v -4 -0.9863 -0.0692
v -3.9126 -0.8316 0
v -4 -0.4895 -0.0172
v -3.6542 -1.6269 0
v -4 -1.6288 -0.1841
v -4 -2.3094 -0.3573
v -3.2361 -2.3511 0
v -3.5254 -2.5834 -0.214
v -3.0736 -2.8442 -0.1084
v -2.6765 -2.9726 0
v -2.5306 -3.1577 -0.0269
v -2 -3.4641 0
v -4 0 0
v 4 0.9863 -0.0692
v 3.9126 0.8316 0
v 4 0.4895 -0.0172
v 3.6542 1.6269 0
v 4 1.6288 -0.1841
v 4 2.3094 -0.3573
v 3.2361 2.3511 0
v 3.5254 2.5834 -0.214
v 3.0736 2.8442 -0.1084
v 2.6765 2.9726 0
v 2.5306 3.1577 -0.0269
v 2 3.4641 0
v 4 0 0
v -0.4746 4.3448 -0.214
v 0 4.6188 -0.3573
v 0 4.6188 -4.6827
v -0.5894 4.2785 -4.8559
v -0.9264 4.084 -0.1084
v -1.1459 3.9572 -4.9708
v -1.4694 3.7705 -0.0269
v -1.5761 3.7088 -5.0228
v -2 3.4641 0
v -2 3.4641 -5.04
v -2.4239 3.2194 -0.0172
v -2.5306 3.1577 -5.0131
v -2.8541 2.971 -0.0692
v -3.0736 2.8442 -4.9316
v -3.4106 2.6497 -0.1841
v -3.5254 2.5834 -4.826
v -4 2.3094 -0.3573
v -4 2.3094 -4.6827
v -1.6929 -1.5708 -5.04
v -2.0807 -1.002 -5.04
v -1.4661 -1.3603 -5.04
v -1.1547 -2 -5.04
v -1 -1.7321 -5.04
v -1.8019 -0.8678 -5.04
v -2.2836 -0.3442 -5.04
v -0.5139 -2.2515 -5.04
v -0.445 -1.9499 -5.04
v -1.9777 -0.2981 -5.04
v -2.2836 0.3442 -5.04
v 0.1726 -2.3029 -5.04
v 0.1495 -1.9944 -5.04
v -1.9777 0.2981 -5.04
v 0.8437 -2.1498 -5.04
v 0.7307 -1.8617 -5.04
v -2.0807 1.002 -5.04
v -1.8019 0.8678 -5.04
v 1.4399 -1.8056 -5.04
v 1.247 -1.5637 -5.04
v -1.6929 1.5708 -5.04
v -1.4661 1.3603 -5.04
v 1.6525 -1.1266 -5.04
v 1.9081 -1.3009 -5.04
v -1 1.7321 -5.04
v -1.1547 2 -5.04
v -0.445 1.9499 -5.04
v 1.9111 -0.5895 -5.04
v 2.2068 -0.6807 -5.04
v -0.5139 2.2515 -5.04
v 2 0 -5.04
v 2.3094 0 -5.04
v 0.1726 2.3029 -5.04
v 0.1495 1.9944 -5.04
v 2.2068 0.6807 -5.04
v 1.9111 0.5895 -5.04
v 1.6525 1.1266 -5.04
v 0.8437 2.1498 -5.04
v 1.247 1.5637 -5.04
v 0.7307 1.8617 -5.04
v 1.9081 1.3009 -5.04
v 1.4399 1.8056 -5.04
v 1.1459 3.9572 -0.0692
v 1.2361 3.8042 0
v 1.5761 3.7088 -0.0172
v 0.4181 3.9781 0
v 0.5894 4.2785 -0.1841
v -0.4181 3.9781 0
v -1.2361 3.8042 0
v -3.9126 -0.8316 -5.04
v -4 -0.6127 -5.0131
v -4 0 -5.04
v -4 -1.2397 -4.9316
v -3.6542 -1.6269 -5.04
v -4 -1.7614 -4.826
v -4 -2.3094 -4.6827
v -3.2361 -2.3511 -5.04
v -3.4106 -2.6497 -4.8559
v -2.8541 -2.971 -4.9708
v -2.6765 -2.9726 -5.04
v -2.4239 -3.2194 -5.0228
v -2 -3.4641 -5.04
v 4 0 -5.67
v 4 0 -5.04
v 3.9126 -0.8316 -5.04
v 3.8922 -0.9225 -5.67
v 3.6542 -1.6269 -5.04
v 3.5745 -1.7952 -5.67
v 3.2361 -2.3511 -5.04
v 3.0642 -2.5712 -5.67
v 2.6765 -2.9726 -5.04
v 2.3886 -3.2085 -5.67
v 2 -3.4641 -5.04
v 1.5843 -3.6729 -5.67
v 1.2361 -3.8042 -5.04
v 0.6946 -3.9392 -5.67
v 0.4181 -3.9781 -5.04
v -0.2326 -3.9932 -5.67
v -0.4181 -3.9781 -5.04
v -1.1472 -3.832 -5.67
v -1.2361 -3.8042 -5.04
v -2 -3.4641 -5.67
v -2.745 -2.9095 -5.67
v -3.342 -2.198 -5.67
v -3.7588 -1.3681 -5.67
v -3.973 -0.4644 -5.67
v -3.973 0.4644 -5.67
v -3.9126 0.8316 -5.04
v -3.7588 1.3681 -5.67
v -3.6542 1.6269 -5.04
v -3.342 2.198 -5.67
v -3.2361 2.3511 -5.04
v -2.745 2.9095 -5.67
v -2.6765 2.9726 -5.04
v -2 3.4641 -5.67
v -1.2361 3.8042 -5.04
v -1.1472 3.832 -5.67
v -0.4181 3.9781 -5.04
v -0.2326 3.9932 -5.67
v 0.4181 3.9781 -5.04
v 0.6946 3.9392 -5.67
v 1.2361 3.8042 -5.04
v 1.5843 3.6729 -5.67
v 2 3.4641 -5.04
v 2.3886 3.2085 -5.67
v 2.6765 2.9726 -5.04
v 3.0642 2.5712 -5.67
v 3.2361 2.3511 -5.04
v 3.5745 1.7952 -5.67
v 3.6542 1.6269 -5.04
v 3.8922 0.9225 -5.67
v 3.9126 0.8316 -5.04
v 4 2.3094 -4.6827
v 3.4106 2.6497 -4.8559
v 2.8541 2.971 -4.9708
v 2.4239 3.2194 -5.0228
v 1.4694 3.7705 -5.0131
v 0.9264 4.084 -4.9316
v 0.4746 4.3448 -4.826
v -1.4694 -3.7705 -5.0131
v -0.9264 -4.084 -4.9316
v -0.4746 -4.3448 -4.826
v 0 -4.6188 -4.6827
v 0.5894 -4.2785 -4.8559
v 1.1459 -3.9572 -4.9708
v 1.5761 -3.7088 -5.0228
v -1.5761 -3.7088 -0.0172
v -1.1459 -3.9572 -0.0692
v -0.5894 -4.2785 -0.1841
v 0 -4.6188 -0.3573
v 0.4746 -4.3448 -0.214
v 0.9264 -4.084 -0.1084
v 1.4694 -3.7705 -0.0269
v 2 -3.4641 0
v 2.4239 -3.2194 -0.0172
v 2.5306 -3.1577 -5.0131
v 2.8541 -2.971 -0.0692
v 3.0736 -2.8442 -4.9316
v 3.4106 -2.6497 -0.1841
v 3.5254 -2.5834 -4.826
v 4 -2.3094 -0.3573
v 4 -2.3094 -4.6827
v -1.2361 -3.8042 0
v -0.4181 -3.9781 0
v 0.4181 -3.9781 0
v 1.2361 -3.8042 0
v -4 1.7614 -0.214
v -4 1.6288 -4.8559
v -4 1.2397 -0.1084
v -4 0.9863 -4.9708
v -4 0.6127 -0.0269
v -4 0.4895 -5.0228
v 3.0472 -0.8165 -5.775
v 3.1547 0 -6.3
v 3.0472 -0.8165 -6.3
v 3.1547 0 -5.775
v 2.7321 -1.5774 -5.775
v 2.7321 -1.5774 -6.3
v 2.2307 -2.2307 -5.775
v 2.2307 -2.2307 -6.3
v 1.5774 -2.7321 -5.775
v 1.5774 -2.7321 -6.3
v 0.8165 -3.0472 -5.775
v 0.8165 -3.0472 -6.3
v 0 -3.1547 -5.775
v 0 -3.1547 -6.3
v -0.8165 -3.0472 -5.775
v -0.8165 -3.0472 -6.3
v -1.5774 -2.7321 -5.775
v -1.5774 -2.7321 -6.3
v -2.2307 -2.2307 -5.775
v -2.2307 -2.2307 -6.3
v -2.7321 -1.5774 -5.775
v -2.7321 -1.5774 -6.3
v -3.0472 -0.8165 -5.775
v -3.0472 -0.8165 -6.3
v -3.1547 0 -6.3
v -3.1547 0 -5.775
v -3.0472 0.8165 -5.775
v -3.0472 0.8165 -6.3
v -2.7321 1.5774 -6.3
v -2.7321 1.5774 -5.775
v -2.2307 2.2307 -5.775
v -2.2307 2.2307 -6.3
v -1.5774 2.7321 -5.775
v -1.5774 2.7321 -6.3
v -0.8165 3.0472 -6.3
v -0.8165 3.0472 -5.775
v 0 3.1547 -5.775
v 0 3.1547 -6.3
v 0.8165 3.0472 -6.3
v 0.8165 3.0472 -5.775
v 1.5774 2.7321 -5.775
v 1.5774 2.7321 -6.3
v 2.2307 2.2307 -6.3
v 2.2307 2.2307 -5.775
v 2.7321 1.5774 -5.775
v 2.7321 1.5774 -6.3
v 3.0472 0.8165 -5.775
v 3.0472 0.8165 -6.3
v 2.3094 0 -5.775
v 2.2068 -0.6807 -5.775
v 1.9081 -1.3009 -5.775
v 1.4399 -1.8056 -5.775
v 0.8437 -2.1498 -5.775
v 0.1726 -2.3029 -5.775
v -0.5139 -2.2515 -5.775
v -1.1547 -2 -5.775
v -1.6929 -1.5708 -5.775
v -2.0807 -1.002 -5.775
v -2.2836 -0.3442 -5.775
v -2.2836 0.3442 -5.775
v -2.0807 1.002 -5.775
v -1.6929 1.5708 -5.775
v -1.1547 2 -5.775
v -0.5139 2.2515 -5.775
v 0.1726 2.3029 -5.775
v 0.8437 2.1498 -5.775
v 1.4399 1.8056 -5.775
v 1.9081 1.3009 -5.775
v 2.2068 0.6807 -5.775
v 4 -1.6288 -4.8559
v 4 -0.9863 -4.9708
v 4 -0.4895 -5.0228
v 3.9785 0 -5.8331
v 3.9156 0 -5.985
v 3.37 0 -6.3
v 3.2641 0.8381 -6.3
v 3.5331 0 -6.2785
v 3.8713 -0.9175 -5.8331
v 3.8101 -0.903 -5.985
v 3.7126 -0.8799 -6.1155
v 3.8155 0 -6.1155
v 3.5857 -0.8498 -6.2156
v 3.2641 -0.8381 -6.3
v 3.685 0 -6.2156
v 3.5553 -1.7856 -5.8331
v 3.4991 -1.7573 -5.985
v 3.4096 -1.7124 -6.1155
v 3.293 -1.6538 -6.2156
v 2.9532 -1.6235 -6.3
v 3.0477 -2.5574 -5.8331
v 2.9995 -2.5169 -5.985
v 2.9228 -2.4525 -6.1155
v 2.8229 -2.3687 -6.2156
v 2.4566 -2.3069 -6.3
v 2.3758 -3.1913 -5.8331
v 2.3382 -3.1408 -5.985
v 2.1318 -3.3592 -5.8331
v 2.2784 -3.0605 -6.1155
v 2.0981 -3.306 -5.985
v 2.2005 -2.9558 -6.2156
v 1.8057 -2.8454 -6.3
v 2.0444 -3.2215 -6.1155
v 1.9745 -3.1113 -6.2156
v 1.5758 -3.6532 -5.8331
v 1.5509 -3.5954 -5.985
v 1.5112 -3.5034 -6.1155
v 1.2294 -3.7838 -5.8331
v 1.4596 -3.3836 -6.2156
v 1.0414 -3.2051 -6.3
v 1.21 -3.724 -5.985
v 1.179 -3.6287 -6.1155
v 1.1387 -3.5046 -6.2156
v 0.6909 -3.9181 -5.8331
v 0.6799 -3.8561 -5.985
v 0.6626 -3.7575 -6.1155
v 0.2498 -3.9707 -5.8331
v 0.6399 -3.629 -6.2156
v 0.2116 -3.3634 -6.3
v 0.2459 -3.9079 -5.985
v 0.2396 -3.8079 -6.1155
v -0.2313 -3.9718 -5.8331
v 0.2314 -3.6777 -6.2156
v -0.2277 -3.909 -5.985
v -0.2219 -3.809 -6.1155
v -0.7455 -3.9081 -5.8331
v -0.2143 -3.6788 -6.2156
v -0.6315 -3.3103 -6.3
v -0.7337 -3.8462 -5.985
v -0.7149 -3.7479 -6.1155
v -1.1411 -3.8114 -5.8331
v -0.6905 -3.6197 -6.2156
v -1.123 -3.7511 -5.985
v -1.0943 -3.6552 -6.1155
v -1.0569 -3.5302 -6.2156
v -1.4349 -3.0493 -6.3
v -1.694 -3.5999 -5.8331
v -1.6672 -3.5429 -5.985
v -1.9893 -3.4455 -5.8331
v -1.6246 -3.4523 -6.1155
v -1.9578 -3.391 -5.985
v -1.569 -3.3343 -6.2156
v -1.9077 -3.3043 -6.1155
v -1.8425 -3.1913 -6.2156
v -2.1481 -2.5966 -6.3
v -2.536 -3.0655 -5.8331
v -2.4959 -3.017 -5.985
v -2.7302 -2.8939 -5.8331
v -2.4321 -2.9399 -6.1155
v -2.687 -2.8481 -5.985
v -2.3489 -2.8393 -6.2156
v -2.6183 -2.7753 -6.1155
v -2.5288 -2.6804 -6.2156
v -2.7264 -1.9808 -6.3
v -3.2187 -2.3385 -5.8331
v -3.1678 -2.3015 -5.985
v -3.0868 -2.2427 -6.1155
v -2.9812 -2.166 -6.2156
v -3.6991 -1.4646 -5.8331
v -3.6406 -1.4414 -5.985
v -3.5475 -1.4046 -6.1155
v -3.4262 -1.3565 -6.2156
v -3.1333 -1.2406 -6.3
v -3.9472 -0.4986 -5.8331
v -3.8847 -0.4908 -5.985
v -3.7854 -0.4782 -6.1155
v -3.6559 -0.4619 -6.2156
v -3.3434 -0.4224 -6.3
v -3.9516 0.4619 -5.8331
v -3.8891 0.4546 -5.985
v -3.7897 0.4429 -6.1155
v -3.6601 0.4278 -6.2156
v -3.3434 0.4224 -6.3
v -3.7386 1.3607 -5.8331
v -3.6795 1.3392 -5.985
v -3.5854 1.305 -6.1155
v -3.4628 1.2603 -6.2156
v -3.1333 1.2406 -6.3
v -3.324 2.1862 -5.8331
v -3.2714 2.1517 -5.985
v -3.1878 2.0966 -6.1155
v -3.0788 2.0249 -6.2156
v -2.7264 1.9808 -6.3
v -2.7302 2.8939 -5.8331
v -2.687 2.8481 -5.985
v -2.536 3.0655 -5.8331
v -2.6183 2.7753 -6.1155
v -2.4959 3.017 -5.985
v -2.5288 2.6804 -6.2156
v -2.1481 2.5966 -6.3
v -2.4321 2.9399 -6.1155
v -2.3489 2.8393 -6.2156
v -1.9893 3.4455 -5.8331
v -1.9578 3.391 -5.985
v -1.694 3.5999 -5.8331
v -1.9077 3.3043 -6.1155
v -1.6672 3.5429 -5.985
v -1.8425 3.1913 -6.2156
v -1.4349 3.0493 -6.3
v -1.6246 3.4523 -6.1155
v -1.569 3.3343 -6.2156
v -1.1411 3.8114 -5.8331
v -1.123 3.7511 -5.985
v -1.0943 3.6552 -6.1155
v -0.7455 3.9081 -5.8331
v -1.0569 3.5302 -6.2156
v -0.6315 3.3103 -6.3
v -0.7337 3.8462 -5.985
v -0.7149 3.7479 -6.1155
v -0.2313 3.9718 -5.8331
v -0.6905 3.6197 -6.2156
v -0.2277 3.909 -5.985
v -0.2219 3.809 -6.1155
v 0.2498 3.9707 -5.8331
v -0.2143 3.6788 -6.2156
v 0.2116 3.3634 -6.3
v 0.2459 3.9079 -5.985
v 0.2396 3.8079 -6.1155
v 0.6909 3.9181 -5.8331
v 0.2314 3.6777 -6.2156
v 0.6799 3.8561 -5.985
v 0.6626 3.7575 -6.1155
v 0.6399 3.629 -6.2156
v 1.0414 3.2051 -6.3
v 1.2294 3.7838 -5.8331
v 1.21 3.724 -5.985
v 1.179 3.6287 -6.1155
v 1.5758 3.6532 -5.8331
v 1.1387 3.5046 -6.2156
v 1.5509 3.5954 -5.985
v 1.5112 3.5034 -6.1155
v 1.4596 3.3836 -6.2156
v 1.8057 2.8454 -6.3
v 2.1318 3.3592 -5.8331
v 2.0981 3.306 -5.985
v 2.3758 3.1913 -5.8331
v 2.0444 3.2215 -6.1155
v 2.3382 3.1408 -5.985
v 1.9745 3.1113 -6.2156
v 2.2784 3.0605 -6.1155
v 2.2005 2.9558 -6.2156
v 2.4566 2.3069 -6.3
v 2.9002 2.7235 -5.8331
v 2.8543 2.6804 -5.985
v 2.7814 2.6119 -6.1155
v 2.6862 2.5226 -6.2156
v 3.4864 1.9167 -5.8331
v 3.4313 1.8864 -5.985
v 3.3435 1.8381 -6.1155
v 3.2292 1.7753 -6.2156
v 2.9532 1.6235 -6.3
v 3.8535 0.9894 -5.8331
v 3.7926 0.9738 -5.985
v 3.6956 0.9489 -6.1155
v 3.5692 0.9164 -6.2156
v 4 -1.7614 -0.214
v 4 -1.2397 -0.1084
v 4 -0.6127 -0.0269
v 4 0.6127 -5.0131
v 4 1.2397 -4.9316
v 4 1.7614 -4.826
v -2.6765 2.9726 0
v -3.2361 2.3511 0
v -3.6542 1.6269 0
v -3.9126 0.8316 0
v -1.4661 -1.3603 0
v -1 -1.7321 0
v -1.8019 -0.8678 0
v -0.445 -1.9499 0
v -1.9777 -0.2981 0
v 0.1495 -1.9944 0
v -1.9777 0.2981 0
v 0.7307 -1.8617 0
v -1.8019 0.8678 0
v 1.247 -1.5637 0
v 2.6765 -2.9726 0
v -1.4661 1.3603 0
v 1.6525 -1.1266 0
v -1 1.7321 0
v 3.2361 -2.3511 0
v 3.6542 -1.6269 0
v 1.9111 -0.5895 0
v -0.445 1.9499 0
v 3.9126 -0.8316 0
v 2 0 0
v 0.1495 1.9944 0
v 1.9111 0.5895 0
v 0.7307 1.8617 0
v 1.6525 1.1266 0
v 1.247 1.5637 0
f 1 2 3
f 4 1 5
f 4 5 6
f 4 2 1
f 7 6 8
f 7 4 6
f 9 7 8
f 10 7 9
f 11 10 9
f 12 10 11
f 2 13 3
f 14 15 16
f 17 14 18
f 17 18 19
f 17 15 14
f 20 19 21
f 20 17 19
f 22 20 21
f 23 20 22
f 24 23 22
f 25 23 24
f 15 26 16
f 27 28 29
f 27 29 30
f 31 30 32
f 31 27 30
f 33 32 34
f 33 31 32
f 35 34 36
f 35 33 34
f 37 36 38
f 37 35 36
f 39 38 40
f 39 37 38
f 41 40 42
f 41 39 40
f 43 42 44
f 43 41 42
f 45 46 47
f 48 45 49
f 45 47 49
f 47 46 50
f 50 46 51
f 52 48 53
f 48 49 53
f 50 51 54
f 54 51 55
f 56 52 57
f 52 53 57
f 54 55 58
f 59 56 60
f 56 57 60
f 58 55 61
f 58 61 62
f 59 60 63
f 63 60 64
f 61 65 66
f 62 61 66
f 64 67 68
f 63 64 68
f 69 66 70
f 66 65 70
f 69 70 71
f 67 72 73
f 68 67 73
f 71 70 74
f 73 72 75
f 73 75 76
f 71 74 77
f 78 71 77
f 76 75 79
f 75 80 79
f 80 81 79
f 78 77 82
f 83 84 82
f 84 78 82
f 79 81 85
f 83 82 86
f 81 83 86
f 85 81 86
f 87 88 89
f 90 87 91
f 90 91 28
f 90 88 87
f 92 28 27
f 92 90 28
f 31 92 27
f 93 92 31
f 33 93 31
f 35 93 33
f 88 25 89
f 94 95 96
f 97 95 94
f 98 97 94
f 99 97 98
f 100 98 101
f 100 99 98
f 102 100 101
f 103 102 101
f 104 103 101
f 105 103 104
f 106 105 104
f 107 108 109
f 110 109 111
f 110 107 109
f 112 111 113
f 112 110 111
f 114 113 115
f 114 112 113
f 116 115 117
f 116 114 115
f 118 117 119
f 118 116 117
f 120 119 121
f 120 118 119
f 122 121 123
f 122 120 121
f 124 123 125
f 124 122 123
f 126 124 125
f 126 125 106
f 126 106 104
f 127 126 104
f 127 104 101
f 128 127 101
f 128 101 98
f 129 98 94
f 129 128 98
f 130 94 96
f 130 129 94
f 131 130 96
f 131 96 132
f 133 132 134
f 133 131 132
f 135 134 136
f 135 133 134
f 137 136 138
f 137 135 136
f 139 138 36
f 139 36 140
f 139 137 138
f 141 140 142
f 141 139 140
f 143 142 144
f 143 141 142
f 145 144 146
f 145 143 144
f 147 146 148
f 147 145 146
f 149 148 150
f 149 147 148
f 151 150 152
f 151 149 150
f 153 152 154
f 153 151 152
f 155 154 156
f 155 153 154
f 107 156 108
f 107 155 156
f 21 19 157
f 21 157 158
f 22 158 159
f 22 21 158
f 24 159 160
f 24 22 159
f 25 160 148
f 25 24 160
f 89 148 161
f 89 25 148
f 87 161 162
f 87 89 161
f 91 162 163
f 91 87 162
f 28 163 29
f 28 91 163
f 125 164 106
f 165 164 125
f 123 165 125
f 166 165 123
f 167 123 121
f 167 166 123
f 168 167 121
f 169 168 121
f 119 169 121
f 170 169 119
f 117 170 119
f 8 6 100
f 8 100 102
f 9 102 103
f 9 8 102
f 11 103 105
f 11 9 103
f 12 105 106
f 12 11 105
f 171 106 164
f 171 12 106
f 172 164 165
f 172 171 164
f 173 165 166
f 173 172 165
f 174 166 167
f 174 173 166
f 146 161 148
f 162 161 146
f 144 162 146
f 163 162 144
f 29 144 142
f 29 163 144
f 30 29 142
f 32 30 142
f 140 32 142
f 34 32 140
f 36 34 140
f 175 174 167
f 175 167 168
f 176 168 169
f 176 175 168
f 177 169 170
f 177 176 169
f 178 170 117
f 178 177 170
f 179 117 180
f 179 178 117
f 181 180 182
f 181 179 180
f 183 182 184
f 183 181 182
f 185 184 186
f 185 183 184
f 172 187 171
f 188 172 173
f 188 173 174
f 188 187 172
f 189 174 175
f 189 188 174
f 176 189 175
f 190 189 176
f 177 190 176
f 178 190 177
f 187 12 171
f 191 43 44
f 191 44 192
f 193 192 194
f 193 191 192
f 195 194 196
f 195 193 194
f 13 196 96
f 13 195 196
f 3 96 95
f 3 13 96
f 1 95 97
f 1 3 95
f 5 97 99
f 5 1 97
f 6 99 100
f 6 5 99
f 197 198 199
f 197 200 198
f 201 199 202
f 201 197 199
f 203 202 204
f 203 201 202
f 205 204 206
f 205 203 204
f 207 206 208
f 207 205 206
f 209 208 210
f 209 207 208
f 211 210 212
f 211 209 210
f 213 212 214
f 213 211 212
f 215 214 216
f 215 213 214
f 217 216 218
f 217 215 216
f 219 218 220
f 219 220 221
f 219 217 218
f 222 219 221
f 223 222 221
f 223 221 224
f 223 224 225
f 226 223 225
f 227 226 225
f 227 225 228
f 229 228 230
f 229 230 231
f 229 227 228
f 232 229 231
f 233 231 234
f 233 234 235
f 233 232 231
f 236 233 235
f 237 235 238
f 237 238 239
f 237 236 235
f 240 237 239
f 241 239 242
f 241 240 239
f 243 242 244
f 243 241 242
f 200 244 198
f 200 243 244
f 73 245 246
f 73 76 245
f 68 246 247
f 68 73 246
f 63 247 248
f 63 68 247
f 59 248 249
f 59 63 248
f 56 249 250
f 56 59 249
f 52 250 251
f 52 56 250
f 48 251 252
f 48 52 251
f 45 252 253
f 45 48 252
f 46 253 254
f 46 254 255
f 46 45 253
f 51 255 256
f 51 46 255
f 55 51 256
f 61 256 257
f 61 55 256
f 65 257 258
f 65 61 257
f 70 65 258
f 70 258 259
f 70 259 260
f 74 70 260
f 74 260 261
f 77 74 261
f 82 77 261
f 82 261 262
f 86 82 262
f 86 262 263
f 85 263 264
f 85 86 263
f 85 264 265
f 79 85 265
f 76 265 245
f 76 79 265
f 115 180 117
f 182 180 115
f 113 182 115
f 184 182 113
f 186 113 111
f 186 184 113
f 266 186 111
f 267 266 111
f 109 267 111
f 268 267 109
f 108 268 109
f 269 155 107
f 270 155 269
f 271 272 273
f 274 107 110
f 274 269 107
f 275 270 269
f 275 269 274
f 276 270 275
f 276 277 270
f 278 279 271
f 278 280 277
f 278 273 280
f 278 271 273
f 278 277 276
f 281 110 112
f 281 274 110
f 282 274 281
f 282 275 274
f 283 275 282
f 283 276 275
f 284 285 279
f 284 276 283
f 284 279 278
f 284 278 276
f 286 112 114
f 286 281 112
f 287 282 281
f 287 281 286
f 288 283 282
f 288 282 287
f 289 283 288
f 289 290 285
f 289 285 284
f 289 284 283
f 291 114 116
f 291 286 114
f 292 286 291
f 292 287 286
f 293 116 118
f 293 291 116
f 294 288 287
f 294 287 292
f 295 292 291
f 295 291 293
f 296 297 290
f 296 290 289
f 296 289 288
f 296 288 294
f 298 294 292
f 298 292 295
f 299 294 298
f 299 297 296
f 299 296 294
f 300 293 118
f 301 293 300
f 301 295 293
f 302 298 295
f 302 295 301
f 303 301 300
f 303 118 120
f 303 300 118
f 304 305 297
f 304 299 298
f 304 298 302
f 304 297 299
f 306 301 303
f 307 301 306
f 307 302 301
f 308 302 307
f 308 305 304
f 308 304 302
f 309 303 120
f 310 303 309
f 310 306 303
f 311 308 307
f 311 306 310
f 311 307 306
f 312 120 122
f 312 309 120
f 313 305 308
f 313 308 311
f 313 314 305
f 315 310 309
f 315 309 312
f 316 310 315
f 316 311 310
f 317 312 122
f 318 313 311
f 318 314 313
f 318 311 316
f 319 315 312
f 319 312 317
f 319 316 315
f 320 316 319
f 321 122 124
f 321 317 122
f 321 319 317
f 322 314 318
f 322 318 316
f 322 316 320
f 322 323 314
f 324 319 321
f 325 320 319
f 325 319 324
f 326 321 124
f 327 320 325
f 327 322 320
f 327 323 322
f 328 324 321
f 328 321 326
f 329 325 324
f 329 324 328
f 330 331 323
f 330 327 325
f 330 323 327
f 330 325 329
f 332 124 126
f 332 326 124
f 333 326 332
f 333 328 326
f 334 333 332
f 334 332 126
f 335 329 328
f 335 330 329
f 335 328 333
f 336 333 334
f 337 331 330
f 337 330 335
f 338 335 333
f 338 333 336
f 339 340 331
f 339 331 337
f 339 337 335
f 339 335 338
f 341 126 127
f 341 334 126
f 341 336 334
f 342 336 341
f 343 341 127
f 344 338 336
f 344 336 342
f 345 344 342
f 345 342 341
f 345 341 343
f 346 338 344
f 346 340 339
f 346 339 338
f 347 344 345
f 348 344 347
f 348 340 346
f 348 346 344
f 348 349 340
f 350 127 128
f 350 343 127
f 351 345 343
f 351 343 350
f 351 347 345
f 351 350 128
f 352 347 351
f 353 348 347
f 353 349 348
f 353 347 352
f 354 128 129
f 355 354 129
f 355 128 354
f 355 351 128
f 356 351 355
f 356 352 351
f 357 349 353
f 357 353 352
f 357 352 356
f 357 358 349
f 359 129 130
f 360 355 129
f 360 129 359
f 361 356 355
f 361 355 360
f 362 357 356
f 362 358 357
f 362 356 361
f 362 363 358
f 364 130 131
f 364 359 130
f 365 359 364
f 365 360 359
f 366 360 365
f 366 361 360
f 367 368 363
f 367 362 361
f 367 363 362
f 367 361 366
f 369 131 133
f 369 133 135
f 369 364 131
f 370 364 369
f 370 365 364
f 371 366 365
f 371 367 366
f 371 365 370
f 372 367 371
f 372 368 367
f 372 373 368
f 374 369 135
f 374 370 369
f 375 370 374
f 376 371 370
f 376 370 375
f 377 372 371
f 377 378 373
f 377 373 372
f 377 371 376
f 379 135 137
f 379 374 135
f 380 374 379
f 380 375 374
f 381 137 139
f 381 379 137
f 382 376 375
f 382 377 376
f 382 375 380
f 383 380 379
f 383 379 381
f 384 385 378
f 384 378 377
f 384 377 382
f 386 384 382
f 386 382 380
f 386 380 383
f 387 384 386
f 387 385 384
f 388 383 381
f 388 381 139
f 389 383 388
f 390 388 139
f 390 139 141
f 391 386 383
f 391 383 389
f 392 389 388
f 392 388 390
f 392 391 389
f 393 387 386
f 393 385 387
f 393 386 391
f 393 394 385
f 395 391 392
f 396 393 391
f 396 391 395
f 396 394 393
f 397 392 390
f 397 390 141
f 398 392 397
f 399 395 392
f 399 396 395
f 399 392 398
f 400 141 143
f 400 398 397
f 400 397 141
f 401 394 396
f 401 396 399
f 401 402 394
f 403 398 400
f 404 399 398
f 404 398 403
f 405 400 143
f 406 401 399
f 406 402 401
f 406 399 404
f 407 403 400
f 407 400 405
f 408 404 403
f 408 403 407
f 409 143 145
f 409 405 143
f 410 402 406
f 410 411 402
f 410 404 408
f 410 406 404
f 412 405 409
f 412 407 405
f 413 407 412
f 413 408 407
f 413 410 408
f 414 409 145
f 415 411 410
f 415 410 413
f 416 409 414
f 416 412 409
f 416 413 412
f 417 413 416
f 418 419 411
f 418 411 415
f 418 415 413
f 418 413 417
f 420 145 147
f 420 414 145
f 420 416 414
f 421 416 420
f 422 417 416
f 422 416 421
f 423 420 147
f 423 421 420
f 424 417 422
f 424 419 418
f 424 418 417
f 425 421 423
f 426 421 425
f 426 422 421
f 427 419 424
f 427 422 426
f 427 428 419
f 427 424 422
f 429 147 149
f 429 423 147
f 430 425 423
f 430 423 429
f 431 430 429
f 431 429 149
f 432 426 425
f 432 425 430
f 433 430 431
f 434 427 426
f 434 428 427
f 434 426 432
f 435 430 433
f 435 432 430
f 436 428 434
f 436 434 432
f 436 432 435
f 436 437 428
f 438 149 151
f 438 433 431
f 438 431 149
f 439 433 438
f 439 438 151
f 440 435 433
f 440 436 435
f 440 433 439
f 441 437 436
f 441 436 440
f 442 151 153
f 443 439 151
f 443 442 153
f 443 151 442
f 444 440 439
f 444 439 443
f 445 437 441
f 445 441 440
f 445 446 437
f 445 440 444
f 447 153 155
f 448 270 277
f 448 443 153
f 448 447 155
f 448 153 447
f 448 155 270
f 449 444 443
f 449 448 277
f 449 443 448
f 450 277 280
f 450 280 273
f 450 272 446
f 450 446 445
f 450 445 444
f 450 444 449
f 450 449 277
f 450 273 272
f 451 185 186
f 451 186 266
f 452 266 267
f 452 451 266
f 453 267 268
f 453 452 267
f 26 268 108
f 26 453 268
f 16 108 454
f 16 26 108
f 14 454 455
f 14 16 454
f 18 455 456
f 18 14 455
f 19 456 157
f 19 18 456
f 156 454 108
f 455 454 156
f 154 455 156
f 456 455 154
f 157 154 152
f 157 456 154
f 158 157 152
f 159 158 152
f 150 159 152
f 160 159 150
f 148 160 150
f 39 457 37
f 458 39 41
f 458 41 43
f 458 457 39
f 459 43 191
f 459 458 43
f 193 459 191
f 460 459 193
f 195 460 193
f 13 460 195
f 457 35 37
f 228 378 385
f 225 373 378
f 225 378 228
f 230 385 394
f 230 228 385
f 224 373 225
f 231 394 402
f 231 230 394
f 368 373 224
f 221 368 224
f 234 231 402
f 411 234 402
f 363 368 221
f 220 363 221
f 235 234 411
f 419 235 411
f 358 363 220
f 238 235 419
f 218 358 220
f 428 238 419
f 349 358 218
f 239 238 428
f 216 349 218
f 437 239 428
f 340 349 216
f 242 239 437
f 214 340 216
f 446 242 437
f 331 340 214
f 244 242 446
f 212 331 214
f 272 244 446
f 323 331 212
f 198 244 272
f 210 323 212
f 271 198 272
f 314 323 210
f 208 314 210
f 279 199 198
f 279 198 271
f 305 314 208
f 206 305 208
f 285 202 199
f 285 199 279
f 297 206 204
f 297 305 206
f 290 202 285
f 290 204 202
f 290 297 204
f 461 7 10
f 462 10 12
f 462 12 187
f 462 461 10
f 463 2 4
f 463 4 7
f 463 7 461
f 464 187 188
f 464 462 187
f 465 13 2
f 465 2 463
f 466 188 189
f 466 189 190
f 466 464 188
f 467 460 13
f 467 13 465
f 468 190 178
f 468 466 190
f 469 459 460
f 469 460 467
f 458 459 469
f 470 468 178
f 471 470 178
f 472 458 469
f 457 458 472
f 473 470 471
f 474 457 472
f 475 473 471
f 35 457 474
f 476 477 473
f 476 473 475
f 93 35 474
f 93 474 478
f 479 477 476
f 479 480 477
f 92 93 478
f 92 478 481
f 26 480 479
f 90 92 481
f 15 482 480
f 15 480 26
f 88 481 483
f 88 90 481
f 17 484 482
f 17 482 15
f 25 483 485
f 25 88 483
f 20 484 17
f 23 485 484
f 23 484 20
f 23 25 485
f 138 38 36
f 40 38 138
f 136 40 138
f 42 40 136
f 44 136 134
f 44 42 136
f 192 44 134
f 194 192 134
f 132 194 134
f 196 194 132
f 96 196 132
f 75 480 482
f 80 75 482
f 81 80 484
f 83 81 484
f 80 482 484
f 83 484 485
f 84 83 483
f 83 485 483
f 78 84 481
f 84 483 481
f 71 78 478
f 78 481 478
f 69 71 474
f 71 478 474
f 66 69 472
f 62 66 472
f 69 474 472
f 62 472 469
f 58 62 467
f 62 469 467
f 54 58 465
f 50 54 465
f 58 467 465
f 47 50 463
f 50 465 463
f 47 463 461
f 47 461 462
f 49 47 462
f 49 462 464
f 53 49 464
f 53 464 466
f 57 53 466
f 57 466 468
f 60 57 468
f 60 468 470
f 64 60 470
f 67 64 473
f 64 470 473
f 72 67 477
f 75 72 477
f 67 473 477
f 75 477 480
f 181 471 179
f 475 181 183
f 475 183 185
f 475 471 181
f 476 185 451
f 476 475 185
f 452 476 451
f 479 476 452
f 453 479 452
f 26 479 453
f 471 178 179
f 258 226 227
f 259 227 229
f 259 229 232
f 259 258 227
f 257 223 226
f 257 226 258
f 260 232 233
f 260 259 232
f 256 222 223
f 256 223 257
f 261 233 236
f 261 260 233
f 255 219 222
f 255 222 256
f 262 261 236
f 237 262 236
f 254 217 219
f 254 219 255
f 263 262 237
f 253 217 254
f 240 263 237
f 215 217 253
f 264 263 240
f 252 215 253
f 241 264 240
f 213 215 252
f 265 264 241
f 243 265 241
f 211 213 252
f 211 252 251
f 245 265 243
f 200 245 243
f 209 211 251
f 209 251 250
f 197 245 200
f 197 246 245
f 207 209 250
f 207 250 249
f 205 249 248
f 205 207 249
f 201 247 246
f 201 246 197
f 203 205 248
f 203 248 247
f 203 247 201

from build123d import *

# Parameters (mm, degrees)
BASE_EXTRUSION_DEPTH    = 5.04
ESQUISSE3_R             = 2.5
ENL_V_MAT_EXTRU_1_DEPTH = 8.920538702
ESQUISSE5_R             = 2.5
ESQUISSE5_R_2           = 2
BOSS_EXTRU_1_DEPTH      = 5.04


with BuildPart() as part:
    # Esquisse1 → Base-Extrusion (new body)
    with BuildSketch(Plane.XY):
        Polygon((4, -2.309401077), (4, 2.309401077), (0, 4.618802154), (-4, 2.309401077), (-4, -2.309401077), (0, -4.618802154), align=None)
    extrude(amount=-BASE_EXTRUSION_DEPTH)

    # Esquisse2 → Enlèvement de matière-Révolution1 (revolve, cut)
    with BuildSketch(Plane(origin=(0, 0, 0), x_dir=(1, 0, 0), z_dir=(0, 1, 0))):
        Polygon((-4, 0), (-9.364768035, 0), (-9.364768035, 5.04), (-4, 5.04), (-8.364768035, 2.52), align=None)
    revolve(axis=Axis((0, 0, -5.04), (0, 0, 1)), mode=Mode.SUBTRACT)

    # Esquisse3 → Enlèv. mat.-Extru.1 (cut, through all)
    with BuildSketch(Plane.XY):
        Circle(ESQUISSE3_R)
    extrude(amount=-ENL_V_MAT_EXTRU_1_DEPTH, mode=Mode.SUBTRACT)

    # Esquisse4 → Boss.-Révol.1 (revolve)
    with BuildSketch(Plane(origin=(0, 0, 0), x_dir=(0, 0, -1), z_dir=(1, 0, 0)), mode=Mode.PRIVATE) as boss_r_vol_1_sk:
        with BuildLine():
            Line((5.04, 4), (5.67, 4))
            ThreePointArc((5.67, 4), (6.115477272, 3.815477272), (6.3, 3.37))
            Line((6.3, 3.37), (6.3, 3.154700538))
            Line((6.3, 3.154700538), (5.775, 3.154700538))
            Line((5.775, 3.154700538), (5.775, 2.309401077))
            Line((5.775, 2.309401077), (5.04, 2.309401077))
            Line((5.04, 2.309401077), (5.04, 4))
        make_face()
    revolve(boss_r_vol_1_sk.sketch.rotate(Axis((0, 0, 0), (0, 0, -1)), 90), axis=Axis((0, 0, 0), (0, 0, -1)))

    # Esquisse5 → Boss.-Extru.1 (add)
    with BuildSketch(Plane.XY):
        Circle(ESQUISSE5_R)
        Circle(ESQUISSE5_R_2, mode=Mode.SUBTRACT)
    extrude(amount=-BOSS_EXTRU_1_DEPTH)


solid = part.part
